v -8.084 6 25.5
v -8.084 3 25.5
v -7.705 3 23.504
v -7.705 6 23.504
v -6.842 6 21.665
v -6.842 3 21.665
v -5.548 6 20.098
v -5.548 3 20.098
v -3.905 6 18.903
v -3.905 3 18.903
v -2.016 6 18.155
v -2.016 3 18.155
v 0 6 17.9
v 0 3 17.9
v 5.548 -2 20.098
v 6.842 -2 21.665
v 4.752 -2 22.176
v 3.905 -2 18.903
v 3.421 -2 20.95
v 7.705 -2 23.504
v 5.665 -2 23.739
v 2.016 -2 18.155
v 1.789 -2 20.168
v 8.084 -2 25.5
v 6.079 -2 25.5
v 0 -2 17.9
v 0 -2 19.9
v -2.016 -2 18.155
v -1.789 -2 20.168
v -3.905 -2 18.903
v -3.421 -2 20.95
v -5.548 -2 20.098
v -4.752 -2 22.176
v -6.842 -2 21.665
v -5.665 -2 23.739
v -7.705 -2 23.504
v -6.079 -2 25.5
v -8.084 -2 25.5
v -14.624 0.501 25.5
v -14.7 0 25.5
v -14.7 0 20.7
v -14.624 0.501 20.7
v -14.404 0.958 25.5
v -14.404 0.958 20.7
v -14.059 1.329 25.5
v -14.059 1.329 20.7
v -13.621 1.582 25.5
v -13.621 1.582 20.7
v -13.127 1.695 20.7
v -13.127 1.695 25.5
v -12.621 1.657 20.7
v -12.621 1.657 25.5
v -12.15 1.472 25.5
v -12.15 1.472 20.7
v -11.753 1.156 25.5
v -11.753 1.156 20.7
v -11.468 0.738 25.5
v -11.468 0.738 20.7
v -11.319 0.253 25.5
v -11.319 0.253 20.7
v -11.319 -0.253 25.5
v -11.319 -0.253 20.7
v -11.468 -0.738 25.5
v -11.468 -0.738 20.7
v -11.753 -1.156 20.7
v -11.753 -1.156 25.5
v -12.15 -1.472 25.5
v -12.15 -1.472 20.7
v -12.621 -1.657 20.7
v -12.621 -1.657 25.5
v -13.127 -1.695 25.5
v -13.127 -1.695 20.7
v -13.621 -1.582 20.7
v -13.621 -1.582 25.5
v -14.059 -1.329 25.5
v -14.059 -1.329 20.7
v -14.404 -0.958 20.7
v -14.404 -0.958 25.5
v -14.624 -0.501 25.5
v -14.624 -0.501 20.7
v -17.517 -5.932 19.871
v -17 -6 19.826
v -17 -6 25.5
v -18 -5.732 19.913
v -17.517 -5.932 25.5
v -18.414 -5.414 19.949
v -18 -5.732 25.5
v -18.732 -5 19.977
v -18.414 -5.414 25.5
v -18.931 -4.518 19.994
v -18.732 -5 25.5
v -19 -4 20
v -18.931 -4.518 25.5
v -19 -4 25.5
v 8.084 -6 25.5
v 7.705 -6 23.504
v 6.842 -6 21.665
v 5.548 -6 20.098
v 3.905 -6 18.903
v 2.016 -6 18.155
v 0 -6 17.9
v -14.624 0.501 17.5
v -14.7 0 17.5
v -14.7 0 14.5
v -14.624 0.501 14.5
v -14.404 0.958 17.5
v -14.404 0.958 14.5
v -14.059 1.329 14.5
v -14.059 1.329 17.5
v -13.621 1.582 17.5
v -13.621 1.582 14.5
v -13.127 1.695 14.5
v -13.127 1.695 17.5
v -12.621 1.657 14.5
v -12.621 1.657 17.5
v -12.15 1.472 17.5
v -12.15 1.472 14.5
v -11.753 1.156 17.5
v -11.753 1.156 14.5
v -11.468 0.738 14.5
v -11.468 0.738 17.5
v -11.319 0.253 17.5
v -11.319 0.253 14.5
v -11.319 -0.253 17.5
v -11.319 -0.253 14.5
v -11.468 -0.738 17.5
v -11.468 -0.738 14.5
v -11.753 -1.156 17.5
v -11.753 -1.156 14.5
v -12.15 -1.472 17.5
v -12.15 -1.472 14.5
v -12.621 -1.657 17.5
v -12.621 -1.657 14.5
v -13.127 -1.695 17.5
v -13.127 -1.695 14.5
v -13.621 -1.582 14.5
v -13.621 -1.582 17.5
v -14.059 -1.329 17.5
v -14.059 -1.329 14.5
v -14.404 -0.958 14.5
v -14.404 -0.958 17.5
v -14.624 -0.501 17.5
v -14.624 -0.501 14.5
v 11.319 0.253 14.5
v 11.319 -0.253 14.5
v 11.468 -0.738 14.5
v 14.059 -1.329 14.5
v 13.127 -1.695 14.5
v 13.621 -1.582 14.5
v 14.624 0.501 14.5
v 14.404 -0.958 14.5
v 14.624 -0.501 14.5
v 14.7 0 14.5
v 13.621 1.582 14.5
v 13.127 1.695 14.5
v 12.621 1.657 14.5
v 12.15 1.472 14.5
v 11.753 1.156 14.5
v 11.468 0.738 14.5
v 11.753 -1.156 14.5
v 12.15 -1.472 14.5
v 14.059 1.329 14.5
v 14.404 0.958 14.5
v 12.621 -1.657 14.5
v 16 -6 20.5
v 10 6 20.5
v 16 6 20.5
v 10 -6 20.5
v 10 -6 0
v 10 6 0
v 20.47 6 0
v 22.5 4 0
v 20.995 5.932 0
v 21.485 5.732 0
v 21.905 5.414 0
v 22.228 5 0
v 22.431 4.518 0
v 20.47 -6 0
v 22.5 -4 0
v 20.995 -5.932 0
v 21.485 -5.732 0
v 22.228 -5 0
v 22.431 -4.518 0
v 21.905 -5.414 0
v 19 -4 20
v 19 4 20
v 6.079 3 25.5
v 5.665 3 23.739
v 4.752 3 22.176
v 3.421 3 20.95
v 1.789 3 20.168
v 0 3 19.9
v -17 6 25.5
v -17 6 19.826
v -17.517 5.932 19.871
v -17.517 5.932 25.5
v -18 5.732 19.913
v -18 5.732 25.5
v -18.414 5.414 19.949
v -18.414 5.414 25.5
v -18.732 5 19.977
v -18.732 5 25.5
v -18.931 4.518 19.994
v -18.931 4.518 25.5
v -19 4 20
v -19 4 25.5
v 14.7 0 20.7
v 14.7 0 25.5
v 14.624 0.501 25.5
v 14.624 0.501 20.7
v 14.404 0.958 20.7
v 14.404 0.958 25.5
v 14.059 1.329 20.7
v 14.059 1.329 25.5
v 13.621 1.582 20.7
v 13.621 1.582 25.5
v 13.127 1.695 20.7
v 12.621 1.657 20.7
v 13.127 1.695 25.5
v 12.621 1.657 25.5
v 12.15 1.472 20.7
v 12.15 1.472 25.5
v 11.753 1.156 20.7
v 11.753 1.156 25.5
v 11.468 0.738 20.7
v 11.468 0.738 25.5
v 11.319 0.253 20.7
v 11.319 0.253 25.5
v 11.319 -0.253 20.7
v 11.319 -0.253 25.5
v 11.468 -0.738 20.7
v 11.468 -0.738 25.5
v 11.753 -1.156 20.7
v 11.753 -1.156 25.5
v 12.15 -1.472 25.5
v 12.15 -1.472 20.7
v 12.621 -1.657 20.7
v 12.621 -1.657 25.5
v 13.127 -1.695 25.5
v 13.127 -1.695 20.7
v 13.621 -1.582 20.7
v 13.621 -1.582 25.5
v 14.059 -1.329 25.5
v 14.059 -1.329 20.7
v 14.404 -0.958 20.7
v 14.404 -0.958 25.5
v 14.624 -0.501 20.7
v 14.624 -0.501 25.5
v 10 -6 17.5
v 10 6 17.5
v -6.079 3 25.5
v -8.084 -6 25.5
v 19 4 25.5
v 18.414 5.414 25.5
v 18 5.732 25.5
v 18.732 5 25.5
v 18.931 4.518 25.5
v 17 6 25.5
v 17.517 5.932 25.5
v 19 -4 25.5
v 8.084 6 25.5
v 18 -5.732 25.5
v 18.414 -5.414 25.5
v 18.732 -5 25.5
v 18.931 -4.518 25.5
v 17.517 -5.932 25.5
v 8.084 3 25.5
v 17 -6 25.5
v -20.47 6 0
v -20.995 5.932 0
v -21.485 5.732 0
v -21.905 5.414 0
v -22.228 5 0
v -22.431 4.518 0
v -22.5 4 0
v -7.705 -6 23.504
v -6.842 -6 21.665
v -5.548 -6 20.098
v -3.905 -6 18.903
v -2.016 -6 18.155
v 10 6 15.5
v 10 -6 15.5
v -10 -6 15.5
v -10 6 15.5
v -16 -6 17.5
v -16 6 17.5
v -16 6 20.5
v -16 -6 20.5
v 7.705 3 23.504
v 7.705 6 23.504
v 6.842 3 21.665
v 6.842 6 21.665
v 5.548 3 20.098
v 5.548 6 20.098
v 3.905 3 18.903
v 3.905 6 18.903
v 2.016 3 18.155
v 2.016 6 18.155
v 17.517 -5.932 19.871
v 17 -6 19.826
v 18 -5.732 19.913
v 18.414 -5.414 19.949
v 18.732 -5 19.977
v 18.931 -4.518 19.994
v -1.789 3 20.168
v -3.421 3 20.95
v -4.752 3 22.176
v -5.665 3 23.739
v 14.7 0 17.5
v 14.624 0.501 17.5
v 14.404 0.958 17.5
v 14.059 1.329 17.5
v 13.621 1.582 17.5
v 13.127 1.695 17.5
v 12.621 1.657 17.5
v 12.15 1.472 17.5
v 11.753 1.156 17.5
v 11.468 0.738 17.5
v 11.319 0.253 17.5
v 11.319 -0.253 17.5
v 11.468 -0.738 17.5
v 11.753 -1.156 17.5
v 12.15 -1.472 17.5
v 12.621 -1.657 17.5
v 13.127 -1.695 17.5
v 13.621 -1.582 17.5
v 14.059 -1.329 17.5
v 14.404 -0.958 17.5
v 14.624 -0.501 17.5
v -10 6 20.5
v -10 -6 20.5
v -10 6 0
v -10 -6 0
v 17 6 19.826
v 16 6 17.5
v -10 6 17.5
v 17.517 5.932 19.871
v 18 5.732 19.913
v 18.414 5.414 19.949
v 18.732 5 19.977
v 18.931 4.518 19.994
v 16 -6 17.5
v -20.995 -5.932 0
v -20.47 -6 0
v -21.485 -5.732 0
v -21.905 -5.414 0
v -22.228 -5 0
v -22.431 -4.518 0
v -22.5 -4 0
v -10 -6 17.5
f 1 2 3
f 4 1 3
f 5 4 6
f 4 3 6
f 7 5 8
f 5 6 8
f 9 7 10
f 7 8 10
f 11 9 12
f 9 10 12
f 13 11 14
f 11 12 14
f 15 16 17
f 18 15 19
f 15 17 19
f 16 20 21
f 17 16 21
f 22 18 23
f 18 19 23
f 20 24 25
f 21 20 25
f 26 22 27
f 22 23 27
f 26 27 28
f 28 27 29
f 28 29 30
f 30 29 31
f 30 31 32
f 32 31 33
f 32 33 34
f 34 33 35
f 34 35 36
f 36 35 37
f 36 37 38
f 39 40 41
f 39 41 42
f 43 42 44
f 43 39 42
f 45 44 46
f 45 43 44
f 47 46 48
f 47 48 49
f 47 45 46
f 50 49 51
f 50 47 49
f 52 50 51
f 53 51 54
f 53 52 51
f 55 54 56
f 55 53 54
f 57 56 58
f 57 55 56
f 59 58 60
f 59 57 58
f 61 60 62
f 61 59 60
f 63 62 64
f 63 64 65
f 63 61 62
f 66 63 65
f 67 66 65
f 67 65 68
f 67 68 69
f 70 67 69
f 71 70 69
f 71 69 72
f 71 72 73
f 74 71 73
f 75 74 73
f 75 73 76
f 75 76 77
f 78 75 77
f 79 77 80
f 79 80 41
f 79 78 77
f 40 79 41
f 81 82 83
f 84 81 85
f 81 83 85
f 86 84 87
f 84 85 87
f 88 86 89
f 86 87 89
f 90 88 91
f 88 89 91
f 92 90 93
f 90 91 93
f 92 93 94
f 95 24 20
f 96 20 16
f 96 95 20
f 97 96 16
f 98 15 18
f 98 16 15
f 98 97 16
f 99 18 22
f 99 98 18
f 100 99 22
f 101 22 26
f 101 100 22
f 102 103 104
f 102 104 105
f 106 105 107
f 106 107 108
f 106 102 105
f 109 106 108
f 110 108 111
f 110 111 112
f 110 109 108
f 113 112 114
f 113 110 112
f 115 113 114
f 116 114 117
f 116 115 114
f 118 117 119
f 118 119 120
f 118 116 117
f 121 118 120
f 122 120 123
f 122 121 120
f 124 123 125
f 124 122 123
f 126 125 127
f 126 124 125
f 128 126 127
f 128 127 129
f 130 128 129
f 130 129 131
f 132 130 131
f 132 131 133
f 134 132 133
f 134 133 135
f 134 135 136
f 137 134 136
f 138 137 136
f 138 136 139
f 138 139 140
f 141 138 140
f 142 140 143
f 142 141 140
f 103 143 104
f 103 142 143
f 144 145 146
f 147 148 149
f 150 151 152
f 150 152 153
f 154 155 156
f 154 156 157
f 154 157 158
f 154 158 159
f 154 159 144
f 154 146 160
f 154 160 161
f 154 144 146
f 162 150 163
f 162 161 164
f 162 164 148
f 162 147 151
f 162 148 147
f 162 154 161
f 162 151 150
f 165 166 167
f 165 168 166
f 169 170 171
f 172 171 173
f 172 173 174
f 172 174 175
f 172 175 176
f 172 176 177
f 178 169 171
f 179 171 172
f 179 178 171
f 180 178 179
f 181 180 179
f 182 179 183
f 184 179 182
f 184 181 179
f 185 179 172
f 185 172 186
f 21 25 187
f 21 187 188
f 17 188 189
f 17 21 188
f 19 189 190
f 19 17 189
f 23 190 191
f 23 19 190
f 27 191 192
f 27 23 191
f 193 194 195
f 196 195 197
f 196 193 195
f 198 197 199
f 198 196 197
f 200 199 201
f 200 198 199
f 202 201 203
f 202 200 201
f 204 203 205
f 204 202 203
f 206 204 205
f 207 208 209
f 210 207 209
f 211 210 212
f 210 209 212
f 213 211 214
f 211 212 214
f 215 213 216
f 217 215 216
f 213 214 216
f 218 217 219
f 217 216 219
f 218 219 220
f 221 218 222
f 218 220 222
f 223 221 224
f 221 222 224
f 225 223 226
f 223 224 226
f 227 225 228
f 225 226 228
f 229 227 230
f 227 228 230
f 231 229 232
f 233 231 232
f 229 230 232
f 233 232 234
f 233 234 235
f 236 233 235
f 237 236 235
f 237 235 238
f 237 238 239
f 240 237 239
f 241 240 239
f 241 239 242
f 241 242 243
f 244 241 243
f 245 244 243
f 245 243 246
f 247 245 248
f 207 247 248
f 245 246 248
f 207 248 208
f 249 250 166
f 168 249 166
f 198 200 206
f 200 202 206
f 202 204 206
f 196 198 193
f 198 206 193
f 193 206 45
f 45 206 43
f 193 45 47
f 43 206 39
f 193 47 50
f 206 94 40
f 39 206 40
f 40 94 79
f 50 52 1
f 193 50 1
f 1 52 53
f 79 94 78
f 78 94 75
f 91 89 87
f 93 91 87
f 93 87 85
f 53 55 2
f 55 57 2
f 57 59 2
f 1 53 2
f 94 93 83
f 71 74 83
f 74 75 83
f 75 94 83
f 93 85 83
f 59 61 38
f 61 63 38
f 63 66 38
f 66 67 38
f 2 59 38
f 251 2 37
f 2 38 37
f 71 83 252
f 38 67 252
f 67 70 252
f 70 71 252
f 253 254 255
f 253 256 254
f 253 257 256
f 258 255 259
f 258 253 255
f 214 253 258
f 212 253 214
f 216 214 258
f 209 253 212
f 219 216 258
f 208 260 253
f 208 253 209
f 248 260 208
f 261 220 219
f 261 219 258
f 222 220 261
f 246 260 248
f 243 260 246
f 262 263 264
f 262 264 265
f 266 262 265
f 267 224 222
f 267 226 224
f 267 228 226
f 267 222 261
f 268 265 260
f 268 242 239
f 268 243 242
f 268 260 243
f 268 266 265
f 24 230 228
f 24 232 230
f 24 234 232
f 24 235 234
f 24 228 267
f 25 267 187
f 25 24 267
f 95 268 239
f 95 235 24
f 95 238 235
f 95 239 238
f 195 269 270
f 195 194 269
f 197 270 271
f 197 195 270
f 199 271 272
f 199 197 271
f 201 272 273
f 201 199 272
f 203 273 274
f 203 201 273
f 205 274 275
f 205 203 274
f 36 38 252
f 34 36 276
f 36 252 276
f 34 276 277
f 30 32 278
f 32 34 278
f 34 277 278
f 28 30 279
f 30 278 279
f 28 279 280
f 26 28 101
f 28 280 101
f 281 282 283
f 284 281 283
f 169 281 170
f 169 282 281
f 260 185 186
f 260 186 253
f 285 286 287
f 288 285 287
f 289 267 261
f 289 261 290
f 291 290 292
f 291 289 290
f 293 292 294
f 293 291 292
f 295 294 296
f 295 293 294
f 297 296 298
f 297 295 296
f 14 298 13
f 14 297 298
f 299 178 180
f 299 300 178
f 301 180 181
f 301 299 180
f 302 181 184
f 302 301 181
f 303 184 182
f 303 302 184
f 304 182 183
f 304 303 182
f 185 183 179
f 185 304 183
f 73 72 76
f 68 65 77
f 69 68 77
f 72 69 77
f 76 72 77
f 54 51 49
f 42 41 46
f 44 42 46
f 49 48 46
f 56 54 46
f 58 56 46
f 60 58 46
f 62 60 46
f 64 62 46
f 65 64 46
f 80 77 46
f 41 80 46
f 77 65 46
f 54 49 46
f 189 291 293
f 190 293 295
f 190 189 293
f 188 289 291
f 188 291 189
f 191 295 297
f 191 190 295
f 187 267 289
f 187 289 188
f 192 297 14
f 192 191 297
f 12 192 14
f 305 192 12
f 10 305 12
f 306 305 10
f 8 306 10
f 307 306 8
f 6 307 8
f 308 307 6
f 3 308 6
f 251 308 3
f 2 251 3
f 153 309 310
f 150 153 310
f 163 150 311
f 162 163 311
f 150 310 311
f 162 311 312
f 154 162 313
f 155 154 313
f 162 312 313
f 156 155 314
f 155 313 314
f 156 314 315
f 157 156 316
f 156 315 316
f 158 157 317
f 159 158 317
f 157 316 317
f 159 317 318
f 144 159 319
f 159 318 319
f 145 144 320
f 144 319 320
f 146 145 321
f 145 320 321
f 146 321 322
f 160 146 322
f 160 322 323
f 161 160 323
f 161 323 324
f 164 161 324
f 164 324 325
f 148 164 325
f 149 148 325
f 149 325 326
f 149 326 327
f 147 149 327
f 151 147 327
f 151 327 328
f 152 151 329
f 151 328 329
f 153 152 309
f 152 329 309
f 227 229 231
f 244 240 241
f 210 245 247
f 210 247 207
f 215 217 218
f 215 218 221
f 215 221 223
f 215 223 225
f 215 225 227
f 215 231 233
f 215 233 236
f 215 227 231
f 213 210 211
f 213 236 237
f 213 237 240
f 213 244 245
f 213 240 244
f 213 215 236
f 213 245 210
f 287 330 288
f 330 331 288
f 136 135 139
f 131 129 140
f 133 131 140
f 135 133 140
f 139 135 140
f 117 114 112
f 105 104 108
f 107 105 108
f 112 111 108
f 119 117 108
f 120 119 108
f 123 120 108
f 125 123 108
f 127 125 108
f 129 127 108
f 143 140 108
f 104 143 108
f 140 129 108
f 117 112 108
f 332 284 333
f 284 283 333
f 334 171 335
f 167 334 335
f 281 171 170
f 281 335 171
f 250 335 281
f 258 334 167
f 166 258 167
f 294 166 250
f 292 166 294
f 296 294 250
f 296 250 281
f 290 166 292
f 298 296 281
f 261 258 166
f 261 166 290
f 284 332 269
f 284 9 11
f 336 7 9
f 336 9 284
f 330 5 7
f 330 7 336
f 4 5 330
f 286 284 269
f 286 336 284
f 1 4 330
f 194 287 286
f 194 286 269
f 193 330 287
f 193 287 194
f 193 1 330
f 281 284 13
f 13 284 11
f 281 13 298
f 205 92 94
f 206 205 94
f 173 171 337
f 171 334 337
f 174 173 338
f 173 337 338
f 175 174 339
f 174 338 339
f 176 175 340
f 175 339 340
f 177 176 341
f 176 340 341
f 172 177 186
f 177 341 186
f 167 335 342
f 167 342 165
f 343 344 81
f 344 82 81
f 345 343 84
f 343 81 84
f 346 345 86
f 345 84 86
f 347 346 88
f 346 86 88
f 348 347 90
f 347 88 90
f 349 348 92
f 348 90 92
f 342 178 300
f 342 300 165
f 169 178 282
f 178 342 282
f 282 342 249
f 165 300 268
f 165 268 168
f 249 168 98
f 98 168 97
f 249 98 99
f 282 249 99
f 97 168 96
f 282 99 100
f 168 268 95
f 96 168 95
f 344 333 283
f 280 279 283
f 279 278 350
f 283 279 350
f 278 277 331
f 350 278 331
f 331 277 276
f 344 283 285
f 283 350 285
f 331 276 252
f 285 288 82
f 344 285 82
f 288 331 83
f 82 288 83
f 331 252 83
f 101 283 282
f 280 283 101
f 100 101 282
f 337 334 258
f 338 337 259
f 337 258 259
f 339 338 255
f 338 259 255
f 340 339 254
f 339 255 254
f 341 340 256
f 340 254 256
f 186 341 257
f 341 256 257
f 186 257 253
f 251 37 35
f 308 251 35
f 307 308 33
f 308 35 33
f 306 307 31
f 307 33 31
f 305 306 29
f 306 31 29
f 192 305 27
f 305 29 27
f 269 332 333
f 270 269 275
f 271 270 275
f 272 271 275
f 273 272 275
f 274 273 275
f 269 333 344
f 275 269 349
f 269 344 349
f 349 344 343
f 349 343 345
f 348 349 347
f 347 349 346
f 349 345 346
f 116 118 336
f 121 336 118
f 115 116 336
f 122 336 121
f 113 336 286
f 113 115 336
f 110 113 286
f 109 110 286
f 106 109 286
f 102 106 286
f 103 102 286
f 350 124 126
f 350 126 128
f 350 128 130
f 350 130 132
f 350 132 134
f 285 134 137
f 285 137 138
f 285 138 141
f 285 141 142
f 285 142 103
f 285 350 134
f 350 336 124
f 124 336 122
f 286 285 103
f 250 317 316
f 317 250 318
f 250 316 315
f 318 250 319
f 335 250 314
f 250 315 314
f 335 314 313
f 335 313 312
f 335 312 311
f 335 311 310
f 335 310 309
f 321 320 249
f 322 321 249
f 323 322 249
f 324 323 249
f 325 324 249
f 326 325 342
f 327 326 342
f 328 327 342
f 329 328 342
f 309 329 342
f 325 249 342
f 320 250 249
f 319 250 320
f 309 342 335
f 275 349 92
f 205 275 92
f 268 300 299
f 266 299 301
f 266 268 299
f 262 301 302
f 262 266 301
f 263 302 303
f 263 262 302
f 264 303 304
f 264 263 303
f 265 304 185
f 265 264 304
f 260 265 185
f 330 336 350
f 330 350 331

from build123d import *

# Parameters (mm, degrees)
F0_W          = 6
F0_H          = 3
F1_DEPTH      = 6
F2_DEPTH      = 2
F2_DEPTH_BACK = 3
F3_R          = 1.7
F4_DEPTH      = 4.8
F5_R          = 2
F6_R          = 1.7
F7_DEPTH      = 3


with BuildPart() as f1:
    # F0 (on Front) → F1 (new body, symmetric)
    with BuildSketch(Plane.XZ):
        with BuildLine():
            Line((10, 0), (22.5, 0))
            Line((22.5, 0), (18.9995524919, 20.0000000164))
            Line((18.9995524919, 20.0000000164), (18.9995524919, 25.5000000164))
            Line((18.9995524919, 25.5000000164), (8.0836130781, 25.5000000164))
            ThreePointArc((8.0836130781, 25.5000000164), (5.5476302699, 20.0983556377), (0, 17.8999996185))
            Line((0, 17.8999996185), (0, 15.5))
            Line((0, 15.5), (10, 15.5))
            Line((10, 15.5), (10, 0))
        make_face()
        with Locations((12.9995524922, 19.0000000164)):
            Rectangle(F0_W, F0_H, mode=Mode.SUBTRACT)
    extrude(amount=F1_DEPTH, both=True)

    # F0 (on Front) → F2 (join, two sides)
    with BuildSketch(Plane.XZ) as f2_sk:
        with BuildLine():
            ThreePointArc((0, 17.8999996185), (5.5476302699, 20.0983556377), (8.0836130781, 25.5000000164))
            Line((8.0836130781, 25.5000000164), (6.0785524919, 25.5000000164))
            ThreePointArc((6.0785524919, 25.5000000164), (4.1324570431, 21.5134004627), (0, 19.8999996185))
            Line((0, 19.8999996185), (0, 17.8999996185))
        make_face()
    extrude(amount=F2_DEPTH)
    extrude(f2_sk.sketch, amount=-F2_DEPTH_BACK)

    # F3 (on face) → F4 (cut)
    with BuildSketch(Plane.XY.offset(25.5000000164)):
        with Locations((12.9995524919, 0)):
            Circle(F3_R)
    extrude(amount=-F4_DEPTH, mode=Mode.SUBTRACT)

    # F5
    f5_edges = [f1.edges().sort_by_distance(p)[0] for p in [
        (20.749776, 6, 10),
        (18.999552, 6, 22.75),
        (20.749776, -6, 10),
        (18.999552, -6, 22.75),
    ]]
    fillet(f5_edges, radius=F5_R)

    # F6 (on face) → F7 (cut)
    with BuildSketch(Plane.XY.offset(17.5000000164)):
        with Locations((12.9995524922, 0)):
            Circle(F6_R)
    extrude(amount=-F7_DEPTH, mode=Mode.SUBTRACT)

    # F8: F1 across plane


with BuildPart() as f1_1:
    add(f1.part)
    add(f1.part.mirror(Plane.YZ))


solid = f1_1.part
